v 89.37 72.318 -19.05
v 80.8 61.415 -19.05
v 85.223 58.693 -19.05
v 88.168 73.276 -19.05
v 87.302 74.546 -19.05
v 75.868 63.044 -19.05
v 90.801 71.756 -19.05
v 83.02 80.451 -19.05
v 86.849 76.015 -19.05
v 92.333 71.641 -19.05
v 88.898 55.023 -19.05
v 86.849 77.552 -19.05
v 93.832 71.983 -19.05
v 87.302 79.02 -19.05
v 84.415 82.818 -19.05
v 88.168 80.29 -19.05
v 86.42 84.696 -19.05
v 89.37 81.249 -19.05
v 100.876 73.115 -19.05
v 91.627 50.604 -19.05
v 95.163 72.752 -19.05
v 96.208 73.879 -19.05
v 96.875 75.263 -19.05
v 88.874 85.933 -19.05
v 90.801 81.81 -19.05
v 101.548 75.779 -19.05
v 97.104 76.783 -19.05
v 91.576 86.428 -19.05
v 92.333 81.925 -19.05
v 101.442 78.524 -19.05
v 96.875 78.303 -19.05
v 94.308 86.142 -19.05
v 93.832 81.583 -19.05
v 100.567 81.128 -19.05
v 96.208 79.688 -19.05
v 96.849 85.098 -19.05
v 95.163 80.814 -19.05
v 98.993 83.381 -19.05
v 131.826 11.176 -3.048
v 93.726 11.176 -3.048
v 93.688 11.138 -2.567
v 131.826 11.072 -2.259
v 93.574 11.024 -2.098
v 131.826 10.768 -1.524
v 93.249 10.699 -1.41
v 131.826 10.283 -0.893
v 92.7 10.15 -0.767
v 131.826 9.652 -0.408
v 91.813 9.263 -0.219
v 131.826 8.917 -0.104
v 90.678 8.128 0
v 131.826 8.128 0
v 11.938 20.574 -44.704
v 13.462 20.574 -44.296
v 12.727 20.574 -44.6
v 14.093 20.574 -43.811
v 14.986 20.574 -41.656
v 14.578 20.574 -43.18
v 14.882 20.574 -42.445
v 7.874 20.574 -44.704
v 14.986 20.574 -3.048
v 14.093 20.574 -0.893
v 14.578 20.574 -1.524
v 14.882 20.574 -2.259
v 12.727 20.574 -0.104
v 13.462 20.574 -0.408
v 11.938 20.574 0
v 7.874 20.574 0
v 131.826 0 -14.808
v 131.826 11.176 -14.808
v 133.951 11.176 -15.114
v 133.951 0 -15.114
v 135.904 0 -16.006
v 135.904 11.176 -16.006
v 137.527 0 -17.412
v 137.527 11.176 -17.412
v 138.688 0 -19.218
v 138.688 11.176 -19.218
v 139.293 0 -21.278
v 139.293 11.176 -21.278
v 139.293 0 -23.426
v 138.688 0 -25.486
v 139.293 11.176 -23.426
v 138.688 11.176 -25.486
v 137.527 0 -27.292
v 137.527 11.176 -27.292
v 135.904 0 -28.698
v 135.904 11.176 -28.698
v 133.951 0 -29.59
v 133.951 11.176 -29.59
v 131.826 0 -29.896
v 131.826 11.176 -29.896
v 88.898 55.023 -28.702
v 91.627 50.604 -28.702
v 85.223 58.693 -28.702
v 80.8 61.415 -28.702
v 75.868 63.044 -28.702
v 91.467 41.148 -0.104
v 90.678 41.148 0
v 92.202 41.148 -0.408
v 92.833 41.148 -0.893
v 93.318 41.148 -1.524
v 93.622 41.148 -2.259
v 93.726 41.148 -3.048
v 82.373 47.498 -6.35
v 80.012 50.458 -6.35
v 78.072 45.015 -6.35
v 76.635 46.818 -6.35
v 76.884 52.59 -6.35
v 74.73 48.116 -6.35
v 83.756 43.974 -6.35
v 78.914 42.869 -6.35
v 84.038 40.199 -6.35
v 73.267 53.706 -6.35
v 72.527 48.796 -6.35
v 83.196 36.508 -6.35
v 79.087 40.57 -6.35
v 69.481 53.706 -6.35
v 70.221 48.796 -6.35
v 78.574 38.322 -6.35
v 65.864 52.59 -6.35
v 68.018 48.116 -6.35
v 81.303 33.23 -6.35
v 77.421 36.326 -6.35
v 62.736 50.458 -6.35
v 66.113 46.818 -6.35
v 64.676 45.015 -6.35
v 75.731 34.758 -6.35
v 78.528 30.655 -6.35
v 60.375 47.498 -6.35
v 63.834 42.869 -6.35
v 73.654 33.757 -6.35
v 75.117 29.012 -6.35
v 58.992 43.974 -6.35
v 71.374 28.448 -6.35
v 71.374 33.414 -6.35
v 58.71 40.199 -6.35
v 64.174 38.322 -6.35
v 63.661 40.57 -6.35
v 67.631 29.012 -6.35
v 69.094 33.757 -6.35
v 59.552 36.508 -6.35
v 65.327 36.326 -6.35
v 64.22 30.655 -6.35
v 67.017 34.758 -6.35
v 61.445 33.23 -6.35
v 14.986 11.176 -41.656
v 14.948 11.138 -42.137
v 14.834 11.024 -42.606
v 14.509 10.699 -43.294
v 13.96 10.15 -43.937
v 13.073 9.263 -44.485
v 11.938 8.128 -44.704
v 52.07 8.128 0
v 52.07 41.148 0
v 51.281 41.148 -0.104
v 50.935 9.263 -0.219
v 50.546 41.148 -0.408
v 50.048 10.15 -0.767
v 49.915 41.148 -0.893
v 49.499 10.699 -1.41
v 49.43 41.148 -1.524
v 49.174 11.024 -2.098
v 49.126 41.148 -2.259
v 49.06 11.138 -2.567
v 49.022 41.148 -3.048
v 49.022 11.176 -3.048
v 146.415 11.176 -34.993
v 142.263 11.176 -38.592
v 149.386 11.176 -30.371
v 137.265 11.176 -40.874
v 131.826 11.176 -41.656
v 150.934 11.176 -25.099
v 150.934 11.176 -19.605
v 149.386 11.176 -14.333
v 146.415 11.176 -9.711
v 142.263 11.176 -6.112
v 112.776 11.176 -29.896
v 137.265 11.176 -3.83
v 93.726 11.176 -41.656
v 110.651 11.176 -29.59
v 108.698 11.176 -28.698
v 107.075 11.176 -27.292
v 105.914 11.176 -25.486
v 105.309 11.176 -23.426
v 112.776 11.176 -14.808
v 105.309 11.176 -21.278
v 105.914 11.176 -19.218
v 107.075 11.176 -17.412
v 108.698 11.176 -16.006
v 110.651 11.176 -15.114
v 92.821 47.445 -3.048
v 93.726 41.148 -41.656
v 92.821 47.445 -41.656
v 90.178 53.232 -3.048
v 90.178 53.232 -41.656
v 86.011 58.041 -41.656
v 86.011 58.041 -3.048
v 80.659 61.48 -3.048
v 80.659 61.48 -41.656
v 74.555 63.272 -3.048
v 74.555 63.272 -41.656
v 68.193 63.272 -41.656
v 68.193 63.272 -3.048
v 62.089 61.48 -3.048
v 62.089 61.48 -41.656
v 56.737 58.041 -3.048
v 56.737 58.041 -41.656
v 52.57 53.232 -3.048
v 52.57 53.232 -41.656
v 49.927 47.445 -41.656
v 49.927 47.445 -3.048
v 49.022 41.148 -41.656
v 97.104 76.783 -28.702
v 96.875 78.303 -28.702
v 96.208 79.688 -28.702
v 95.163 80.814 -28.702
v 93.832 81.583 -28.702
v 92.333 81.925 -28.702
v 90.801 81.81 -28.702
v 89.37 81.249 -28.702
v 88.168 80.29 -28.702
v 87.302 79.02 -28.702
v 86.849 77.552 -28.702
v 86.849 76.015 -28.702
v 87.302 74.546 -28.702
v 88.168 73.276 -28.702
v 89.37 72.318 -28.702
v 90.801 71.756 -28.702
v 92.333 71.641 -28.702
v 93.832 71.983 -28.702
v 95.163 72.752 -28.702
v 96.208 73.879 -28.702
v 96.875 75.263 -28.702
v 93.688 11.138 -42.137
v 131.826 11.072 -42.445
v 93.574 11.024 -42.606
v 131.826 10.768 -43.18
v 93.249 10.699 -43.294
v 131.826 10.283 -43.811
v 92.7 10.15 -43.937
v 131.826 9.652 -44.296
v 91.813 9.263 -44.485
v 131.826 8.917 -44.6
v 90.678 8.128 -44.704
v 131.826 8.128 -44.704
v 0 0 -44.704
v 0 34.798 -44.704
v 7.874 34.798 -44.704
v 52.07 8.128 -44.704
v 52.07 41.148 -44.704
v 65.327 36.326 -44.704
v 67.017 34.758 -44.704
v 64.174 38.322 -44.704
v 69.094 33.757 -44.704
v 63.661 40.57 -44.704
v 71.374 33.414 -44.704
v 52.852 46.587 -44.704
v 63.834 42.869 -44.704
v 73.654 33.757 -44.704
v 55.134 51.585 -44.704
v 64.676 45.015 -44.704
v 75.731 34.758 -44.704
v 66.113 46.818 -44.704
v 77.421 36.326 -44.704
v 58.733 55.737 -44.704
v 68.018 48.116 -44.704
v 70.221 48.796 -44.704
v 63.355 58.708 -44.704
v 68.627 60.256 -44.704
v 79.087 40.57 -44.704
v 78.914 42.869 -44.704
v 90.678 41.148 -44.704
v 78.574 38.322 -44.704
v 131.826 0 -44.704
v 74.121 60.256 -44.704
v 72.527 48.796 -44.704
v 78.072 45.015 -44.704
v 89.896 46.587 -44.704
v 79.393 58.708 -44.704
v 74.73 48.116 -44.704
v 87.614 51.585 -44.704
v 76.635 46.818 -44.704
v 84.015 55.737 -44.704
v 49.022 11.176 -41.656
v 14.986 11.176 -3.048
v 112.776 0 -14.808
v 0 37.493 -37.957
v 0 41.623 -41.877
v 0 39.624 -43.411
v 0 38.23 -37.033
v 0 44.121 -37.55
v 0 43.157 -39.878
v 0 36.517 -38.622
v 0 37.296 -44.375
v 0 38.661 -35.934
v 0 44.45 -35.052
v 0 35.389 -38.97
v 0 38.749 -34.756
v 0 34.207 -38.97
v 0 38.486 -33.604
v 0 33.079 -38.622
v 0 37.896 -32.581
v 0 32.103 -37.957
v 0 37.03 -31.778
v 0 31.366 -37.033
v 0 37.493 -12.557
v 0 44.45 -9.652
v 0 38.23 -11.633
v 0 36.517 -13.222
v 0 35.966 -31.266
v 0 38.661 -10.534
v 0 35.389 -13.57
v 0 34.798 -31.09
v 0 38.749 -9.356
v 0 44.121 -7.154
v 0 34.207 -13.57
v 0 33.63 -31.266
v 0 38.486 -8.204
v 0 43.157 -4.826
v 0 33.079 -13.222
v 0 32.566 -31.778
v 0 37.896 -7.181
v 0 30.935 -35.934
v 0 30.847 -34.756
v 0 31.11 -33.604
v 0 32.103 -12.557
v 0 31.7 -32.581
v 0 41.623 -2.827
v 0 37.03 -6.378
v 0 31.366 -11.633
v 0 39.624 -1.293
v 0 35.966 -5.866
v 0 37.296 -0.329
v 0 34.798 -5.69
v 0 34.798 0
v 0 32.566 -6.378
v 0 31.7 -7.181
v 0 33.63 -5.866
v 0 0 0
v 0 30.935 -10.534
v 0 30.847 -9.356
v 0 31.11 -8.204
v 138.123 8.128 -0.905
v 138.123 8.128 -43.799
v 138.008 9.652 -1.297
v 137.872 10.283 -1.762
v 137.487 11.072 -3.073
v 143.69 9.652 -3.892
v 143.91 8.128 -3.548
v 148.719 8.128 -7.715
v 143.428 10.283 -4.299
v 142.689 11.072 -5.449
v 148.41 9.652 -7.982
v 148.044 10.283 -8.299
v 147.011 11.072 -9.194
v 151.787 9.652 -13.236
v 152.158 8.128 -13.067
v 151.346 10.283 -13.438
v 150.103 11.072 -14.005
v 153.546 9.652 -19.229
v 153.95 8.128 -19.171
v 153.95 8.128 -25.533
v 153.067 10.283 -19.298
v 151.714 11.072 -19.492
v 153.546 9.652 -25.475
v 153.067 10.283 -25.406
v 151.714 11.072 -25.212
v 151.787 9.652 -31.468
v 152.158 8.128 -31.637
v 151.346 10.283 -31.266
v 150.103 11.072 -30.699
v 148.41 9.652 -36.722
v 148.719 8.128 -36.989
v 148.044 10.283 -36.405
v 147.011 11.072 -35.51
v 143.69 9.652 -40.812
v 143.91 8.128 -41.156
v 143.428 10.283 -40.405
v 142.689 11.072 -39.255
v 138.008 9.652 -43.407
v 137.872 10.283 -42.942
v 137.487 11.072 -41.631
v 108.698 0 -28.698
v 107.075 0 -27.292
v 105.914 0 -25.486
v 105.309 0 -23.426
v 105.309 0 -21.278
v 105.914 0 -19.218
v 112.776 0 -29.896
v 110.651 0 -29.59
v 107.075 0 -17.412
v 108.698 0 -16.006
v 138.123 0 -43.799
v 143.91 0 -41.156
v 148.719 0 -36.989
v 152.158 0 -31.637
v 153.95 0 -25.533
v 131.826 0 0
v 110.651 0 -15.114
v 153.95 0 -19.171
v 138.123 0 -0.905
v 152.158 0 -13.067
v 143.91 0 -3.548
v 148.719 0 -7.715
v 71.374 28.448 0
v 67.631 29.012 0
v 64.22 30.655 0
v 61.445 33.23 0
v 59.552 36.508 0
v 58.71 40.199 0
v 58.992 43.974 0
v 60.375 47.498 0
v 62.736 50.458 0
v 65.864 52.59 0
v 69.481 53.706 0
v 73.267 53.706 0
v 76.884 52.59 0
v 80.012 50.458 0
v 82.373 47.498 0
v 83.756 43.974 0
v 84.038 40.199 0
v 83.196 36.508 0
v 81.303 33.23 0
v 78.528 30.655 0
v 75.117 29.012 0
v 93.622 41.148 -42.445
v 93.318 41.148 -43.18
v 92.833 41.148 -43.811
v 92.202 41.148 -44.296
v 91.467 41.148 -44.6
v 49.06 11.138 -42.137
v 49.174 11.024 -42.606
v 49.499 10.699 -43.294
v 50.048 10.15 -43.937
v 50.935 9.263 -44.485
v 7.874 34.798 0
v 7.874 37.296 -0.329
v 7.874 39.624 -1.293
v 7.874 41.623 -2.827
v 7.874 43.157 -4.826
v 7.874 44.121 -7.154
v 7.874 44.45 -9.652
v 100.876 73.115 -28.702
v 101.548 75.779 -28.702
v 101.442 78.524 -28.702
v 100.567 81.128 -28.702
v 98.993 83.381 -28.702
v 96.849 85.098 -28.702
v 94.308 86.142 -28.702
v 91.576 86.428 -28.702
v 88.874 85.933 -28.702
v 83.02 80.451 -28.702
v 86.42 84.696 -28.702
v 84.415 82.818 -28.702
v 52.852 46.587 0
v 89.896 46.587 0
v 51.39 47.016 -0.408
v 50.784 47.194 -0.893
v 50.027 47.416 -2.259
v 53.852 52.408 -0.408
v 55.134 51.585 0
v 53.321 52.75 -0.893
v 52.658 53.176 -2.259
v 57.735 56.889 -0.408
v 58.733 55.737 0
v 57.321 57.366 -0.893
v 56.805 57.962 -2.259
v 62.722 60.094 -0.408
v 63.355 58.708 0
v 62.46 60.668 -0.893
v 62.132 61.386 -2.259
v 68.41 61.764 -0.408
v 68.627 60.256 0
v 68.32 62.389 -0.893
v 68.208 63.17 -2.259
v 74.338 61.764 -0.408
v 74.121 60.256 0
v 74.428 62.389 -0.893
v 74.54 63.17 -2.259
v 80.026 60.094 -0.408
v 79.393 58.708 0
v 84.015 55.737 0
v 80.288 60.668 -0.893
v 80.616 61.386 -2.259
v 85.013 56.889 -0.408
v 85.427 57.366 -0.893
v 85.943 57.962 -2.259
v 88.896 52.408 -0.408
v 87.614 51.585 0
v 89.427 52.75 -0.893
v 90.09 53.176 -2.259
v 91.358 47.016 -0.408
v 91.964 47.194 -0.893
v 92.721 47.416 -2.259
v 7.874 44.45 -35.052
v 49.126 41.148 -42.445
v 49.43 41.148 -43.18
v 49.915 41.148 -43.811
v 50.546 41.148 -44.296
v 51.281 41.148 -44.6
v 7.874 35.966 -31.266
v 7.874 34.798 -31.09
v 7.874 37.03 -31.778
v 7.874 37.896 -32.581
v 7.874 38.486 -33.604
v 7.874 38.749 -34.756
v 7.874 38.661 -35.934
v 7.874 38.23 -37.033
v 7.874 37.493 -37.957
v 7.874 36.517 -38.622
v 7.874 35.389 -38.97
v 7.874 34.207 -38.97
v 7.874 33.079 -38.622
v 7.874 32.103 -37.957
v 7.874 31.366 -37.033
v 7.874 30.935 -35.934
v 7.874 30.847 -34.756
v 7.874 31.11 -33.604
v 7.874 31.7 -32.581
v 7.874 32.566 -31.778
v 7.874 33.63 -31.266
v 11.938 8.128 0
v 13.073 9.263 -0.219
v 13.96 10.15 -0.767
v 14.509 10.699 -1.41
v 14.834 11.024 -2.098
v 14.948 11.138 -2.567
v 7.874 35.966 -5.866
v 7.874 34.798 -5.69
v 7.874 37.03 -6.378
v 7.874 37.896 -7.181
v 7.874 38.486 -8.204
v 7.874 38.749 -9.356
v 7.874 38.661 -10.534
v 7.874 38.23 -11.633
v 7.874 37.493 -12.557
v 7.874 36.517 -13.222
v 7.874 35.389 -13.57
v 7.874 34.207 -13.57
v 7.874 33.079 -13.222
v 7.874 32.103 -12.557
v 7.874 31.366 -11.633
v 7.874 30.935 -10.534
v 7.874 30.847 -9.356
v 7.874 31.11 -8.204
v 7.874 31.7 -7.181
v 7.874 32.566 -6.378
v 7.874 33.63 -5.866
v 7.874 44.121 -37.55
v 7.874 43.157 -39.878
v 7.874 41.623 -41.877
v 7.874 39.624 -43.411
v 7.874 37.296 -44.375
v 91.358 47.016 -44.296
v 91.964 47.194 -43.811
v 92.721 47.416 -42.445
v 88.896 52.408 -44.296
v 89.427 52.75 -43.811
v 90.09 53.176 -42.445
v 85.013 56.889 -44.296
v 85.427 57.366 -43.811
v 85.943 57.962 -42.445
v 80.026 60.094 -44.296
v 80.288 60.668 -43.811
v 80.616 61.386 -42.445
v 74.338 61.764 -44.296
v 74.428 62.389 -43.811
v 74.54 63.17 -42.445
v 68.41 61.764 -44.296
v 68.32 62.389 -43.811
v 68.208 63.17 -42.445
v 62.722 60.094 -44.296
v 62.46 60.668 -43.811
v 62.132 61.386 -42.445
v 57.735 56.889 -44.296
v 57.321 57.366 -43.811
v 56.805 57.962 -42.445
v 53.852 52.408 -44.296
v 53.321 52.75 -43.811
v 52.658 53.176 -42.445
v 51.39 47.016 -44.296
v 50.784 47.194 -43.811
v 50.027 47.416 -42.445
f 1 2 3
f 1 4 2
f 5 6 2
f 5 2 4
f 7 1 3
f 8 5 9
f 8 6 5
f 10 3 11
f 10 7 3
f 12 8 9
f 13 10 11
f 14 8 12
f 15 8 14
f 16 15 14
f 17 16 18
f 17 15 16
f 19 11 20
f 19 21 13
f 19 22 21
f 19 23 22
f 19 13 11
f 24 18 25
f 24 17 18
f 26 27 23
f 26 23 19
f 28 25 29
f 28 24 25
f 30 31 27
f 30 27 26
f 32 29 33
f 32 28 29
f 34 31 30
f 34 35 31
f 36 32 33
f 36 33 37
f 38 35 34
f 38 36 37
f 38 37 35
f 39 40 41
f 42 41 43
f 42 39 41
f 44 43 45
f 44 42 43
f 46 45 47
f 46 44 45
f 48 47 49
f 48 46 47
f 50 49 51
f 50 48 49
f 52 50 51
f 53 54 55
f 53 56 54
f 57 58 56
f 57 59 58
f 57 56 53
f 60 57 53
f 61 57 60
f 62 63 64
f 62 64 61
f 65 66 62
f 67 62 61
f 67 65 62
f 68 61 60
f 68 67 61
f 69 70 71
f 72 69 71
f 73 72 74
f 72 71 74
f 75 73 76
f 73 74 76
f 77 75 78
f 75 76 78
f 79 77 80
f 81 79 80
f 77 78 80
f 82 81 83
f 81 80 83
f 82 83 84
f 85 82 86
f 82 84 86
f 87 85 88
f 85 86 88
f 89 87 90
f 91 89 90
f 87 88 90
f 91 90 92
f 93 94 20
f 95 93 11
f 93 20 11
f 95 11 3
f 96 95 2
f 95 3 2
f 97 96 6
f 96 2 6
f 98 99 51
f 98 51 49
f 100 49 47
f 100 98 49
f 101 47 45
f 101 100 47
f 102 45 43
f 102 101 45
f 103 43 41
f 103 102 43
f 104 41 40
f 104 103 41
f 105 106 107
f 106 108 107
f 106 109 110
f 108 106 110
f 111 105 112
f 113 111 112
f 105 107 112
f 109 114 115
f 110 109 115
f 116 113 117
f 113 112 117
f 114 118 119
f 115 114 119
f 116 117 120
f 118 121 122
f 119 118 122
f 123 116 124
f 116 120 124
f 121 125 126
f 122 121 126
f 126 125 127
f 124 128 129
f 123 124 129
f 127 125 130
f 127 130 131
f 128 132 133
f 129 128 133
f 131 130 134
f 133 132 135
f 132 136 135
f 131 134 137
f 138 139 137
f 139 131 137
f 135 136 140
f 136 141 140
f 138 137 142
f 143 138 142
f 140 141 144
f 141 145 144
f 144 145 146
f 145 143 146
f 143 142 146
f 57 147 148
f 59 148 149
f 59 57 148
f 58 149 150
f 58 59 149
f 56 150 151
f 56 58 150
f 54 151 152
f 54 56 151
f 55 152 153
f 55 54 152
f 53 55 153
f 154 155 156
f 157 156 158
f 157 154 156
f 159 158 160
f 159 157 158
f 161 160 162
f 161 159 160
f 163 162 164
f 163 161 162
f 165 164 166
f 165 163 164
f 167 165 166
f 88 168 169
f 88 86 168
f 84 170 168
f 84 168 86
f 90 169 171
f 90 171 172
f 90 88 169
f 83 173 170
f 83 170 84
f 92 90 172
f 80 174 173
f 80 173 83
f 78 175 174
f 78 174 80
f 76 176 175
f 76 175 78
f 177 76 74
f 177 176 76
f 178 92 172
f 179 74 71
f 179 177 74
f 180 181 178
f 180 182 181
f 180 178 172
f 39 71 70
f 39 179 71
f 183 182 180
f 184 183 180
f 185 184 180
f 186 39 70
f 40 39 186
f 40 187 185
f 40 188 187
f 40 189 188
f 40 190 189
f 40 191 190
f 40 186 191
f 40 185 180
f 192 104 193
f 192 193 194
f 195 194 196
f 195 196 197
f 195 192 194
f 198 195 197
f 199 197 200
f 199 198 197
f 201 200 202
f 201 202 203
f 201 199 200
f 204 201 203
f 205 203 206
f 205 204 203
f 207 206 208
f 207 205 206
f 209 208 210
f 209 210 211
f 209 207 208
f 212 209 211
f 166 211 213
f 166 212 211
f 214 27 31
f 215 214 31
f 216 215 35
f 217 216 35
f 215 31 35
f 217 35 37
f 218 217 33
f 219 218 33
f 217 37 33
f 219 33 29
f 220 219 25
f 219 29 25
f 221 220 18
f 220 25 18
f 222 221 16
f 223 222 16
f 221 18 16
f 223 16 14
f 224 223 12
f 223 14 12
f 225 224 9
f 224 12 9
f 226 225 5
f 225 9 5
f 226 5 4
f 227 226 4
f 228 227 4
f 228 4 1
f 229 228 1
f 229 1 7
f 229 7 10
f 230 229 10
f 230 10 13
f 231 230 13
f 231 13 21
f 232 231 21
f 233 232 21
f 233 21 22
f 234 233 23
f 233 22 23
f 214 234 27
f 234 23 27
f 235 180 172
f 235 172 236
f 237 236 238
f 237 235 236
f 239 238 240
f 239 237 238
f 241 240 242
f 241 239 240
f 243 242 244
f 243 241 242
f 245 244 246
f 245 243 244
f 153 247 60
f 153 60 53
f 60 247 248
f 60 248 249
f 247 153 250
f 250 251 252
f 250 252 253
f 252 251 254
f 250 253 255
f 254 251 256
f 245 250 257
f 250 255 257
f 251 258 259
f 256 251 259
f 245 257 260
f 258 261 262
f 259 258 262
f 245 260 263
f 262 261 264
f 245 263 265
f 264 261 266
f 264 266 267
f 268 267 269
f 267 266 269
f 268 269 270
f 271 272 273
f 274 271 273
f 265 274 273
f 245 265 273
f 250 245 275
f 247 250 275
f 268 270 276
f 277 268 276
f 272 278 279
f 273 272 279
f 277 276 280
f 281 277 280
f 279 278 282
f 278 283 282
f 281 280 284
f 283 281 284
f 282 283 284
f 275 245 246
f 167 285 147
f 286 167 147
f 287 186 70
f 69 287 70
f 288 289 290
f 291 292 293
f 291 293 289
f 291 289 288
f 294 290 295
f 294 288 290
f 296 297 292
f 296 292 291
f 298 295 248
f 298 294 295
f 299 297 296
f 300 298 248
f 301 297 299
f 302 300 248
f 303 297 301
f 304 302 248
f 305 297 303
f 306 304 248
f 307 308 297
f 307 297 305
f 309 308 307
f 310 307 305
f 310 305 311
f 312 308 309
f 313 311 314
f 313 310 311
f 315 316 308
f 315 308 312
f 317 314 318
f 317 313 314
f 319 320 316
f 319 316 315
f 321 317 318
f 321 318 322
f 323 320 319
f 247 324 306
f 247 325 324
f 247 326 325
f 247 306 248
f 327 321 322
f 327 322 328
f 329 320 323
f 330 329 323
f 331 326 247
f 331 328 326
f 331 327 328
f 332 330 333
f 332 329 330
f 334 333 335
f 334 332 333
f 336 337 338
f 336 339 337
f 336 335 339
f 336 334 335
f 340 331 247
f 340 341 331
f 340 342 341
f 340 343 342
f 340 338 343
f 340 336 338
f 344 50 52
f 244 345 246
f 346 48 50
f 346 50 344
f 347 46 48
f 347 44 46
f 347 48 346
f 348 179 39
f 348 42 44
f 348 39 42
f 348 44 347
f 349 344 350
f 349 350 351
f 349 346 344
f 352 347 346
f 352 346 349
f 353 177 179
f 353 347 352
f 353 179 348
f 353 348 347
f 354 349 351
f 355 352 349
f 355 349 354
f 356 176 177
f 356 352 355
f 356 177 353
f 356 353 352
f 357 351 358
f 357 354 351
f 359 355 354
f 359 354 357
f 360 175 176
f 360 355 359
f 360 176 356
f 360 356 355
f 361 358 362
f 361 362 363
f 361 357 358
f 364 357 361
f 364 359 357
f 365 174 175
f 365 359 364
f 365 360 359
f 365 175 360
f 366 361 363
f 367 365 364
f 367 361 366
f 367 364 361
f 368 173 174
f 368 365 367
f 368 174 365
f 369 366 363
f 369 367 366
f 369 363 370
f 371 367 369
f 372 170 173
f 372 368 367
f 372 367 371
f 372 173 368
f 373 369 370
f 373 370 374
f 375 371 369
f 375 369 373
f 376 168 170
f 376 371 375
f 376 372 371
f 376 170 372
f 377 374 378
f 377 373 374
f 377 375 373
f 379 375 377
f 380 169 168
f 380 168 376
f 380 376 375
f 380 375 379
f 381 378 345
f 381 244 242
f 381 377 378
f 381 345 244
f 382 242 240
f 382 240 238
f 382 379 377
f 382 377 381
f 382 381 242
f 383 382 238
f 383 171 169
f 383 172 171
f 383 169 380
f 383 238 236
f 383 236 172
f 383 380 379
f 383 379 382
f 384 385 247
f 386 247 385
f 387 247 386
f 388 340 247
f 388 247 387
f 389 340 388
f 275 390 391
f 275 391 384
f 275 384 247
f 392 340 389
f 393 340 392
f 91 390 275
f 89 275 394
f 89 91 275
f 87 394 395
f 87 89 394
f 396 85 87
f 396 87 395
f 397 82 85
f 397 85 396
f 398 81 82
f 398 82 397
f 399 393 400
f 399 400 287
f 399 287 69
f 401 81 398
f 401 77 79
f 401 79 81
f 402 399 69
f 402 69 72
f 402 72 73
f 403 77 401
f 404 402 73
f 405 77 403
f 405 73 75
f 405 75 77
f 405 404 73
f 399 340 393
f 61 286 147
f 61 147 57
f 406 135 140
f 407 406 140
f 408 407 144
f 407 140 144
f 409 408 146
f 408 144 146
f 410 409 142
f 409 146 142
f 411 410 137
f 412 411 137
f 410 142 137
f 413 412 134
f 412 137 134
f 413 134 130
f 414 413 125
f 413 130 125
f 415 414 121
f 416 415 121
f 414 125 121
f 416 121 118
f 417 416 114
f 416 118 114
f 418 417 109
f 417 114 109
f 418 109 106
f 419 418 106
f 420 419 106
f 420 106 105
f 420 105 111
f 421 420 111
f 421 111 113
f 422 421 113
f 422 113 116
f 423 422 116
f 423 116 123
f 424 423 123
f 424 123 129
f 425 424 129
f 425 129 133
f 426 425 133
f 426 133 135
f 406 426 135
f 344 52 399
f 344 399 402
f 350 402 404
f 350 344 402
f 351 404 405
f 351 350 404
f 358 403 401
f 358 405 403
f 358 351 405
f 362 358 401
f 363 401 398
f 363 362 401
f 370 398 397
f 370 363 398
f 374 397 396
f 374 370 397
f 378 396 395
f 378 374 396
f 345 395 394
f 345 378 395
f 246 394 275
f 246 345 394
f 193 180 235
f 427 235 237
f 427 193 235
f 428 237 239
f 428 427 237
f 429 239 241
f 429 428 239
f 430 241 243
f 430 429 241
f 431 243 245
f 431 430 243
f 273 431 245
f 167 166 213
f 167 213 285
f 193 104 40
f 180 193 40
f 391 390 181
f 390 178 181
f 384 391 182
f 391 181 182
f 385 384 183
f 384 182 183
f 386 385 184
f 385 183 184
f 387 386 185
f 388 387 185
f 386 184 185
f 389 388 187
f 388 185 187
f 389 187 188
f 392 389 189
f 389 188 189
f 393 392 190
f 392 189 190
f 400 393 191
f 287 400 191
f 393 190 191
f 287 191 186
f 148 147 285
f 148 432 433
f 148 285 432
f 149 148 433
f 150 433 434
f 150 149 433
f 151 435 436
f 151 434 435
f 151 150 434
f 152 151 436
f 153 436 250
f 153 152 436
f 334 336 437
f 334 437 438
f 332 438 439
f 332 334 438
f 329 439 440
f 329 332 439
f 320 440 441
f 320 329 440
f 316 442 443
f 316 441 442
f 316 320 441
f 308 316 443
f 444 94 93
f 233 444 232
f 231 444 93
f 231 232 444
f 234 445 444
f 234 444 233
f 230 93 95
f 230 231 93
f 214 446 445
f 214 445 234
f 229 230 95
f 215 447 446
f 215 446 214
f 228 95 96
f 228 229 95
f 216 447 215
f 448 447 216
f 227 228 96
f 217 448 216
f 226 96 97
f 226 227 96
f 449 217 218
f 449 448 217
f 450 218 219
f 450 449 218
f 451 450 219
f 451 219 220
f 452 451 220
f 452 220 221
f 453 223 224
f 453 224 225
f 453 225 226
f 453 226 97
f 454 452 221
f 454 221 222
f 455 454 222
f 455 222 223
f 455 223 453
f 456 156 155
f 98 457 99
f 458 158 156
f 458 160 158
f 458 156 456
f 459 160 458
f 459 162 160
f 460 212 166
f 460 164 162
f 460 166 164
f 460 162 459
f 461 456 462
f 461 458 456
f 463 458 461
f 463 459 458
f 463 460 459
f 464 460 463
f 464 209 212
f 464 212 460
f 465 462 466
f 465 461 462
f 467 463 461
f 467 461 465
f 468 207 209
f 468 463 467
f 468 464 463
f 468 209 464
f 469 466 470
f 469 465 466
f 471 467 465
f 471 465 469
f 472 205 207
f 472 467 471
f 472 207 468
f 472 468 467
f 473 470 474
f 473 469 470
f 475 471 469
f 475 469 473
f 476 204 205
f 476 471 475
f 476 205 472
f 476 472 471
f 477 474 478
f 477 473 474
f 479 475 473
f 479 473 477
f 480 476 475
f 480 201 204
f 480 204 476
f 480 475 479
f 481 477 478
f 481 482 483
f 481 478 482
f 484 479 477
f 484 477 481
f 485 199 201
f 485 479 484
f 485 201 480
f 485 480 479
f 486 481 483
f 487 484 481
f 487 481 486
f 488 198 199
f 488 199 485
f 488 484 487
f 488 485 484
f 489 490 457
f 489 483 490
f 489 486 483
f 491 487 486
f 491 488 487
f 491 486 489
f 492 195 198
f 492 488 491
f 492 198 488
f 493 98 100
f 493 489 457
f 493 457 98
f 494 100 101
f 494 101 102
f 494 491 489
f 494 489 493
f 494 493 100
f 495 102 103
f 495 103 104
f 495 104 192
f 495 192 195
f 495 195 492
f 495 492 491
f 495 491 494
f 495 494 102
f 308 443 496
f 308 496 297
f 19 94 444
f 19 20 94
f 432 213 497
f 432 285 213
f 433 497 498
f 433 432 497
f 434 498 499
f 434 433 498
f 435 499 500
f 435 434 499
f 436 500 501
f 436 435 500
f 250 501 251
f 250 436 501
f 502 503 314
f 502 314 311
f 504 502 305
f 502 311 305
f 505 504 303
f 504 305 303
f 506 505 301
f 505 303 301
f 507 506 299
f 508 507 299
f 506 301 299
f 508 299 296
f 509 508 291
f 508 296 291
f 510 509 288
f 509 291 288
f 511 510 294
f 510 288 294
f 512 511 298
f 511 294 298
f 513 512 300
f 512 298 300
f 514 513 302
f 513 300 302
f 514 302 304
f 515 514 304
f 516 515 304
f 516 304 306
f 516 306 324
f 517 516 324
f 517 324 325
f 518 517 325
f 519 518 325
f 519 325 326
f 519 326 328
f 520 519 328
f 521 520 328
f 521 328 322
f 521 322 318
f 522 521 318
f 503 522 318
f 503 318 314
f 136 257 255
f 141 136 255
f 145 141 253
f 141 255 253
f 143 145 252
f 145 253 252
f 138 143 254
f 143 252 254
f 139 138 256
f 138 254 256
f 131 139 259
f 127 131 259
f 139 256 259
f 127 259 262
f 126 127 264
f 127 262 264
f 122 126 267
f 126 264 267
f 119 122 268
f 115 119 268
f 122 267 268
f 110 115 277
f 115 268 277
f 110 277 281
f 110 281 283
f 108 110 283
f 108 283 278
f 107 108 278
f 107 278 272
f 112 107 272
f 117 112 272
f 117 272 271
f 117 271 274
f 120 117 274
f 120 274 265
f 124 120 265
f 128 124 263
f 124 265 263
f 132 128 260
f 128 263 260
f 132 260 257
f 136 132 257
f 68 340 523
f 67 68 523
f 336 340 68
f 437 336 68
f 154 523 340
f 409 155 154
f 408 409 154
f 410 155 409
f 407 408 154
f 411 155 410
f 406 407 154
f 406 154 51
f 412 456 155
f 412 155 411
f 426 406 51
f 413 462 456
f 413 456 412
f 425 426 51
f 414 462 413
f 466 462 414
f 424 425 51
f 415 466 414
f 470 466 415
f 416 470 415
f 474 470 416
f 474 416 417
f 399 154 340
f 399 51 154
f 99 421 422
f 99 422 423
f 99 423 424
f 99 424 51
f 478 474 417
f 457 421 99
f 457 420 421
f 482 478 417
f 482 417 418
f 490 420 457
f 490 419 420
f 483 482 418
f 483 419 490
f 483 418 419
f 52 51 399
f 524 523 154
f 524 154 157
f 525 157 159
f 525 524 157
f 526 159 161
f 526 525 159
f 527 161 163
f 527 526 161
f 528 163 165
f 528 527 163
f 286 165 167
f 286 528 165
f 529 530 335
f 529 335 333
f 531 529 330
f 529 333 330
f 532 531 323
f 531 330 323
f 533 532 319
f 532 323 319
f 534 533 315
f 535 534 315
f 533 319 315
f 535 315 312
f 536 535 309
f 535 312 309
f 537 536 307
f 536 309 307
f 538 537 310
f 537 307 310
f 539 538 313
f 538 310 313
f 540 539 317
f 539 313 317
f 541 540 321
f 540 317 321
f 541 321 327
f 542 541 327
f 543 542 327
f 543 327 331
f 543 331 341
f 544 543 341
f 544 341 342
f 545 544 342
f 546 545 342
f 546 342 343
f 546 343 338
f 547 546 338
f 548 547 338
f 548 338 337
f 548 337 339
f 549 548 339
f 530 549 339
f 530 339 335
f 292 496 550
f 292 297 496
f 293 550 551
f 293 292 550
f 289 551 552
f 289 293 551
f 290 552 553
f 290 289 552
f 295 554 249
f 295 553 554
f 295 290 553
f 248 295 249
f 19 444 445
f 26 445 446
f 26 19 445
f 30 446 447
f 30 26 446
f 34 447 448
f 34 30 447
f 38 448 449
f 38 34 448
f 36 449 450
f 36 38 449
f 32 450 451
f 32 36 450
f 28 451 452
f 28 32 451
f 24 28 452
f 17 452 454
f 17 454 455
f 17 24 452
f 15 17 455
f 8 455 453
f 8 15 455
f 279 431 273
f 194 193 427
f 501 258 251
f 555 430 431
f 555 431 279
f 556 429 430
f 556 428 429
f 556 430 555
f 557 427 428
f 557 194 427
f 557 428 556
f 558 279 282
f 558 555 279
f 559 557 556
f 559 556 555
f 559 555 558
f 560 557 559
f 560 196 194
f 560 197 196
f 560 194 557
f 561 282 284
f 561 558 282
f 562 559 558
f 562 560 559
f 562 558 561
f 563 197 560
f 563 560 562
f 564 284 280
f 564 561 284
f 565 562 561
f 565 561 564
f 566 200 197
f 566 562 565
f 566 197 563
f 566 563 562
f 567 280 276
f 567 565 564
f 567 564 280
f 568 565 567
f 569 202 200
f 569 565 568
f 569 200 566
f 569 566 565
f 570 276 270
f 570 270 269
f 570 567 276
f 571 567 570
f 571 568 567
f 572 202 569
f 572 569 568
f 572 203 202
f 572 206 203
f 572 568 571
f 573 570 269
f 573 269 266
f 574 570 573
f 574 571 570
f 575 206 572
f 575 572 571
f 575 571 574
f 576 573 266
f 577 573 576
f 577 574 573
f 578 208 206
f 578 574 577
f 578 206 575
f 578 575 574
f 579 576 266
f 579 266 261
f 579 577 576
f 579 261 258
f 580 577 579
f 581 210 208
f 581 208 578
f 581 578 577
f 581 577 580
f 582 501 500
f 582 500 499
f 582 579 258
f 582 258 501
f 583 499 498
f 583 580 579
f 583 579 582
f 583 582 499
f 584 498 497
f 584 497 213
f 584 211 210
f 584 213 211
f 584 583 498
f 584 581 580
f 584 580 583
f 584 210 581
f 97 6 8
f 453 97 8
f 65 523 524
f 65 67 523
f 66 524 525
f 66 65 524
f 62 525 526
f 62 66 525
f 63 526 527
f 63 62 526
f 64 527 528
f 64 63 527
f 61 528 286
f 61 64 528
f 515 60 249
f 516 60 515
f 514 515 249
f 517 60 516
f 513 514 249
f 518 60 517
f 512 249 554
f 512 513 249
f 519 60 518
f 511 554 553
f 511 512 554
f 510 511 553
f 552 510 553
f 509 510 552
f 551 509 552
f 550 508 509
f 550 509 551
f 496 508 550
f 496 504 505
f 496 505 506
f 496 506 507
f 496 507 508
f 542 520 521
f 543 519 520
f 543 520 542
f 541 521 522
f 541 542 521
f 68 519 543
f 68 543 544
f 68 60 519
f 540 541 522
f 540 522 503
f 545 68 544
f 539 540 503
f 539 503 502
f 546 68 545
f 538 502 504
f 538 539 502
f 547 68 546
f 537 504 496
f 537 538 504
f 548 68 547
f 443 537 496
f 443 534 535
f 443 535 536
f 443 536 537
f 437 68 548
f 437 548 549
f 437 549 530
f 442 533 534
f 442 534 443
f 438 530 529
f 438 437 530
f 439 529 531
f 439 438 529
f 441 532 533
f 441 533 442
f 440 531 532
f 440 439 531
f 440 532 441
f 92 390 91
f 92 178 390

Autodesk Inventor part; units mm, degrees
ref_plane "YZ Plane" through (0, 0, 0) normal (1, 0, 0) x (0, 1, 0)
ref_plane "XZ Plane" through (0, 0, 0) normal (0, 1, 0) x (-1, 0, 0)
ref_plane "XY Plane" through (0, 0, 0) normal (0, 0, 1) x (1, 0, 0)
sketch "Boceto1" plane through (0, 0, 0) normal (0, 0, 1) x (1, 0, 0)
  line L0 (0, 0) -> (7.874, 0)
  line L1 (7.874, 0) -> (7.874, 44.45)
  line L2 (7.874, 44.45) -> (0, 44.45)
  line L3 (0, 44.45) -> (0, 0)
  line L4 (7.874, 0) -> (14.986, 0)
  line L5 (14.986, 0) -> (14.986, 20.574)
  line L6 (14.986, 20.574) -> (7.874, 20.574)
  line L7 (7.874, 20.574) -> (7.874, 0)
  line L8 (14.986, 0) -> (154.178, 0)
  line L9 (154.178, 0) -> (154.178, 11.176)
  line L10 (154.178, 11.176) -> (14.986, 11.176)
  line L11 (14.986, 11.176) -> (14.986, 0)
  line L12 (71.374, -17.734) -> (71.374, 53.7608) construction
  line L13 (-9.4803, 41.148) -> (163.4374, 41.148) construction
  arc A0 (93.726, 41.148) -> (49.022, 41.148) centre (71.374, 41.148) ccw
  line L14 (49.022, 41.148) -> (49.022, 11.176)
  line L15 (93.726, 41.148) -> (93.726, 11.176)
  point P0 (14.986, 11.176)
  dimension "d0" = 7.874
  dimension "d1" = 44.45
  dimension "d2" = 7.112
  dimension "d3" = 20.574
  dimension "d4" = 139.192
  dimension "d5" = 11.176
  dimension "d6" = 63.5
  dimension "d7" = 41.148
  dimension "d8" = 44.704
extrude "Base" add sketch "Boceto1" against normal blind 44.704
sketch "Boceto2" plane through (0, 0, 0) normal (-1, 0, 0) x (0, 0, 1)
  line L0 (0, 44.45) -> (-44.704, 44.45) projected
  line L1 (-35.052, 44.45) -> (-9.652, 44.45)
  line L2 (0, 34.798) -> (0, 0)
  line L3 (0, 0) -> (-44.704, 0)
  line L4 (-44.704, 0) -> (-44.704, 34.798)
  arc A0 (-35.052, 44.45) -> (-44.704, 34.798) centre (-35.052, 34.798) ccw
  arc A1 (0, 34.798) -> (-9.652, 44.45) centre (-9.652, 34.798) ccw
  line L5 (-44.704, 34.798) -> (-44.704, 44.45)
  line L6 (-44.704, 41.148) -> (-44.704, 11.176) projected
  line L7 (-44.704, 44.45) -> (-35.052, 44.45)
  line L8 (-9.652, 44.45) -> (0, 44.45)
  line L9 (0, 44.45) -> (0, 34.798)
  line L10 (0, 11.176) -> (0, 41.148) projected
  arc A2 (-35.052, 44.45) -> (-41.877, 41.623) centre (-35.052, 34.798) ccw
  arc A3 (0, 34.798) -> (-2.827, 41.623) centre (-9.652, 34.798) ccw
  dimension "d11" = 9.652
extrude "RedondeoIzquierda" cut sketch "Boceto2" against normal blind 7.874 contours L9 A1 L0 | A0 L5 L0
sketch "Boceto3" plane through (93.726, 11.176, 0) normal (0, 1, 0) x (1, 0, 0)
  line L0 (38.1, 57.3464) -> (38.1, -17.2234) construction
  line L1 (80.6333, 22.352) -> (-7.9842, 22.352) construction
  line L2 (60.452, 0) -> (60.452, 44.704) projected
  line L3 (60.452, 0) -> (0, 0) projected
  line L4 (0, 44.704) -> (60.452, 44.704) projected
  line L5 (-22.352, 117.0356) -> (-22.352, -54.5943) construction
  arc A0 (38.1, 0) -> (38.1, 44.704) centre (38.1, 22.352) ccw
  point P0 (-93.726, 0)
  point P1 (60.452, 22.352)
  dimension "d14" = 22.352
  dimension "d15" = 44.704
  dimension "d16" = 22.352
  dimension "d17" = 71.374
  dimension "d18" = 60.452
  dimension "d19" = 44.704
extrude "RedondeoDerecha" cut sketch "Boceto3" against normal blind 11.176
sketch "Boceto4" plane through (93.726, 11.176, 0) normal (0, 1, 0) x (1, 0, 0)
  line L0 (53.4052, 29.8958) -> (-6.9452, 29.8958) construction
  line L1 (53.4052, 14.8082) -> (-2.7405, 14.8082) construction
  line L2 (0, 44.704) -> (38.1, 44.704) projected
  line L3 (38.1, 0) -> (0, 0) projected
  line L4 (40.7958, 60.876) -> (40.7958, -13.6937) construction
  arc A0 (38.1, 0) -> (38.1, 44.704) centre (38.1, 22.352) ccw construction
  arc A1 (38.1, 14.8082) -> (38.1, 29.8958) centre (38.1, 22.352) ccw
  line L5 (38.1, 22.352) -> (19.05, 22.352) construction
  arc A2 (19.05, 29.8958) -> (19.05, 14.8082) centre (19.05, 22.352) ccw
  line L6 (19.05, 29.8958) -> (38.1, 29.8958)
  line L7 (19.05, 14.8082) -> (38.1, 14.8082)
  point P0 (-93.726, 0)
  dimension "d22" = 15.0876
  dimension "d23" = 44.704
  dimension "d24" = 14.8082
  dimension "d26" = 19.05
extrude "HuecoDerecha" cut sketch "Boceto4" against normal blind 11.176
sketch "Boceto5" plane through (0, 0, 0) normal (0, 0, 1) x (1, 0, 0)
  arc A0 (93.726, 41.148) -> (49.022, 41.148) centre (71.374, 41.148) ccw construction
  point P0 (0, 0)
hole "AgujeroCentral" at (71.374, 41.148, 0) direction (0, 0, -1) diameter 15.4686 end through all counterbore diameter 25.4 counterbore depth 6.35
sketch "Boceto6" plane through (0, 0, -44.704) normal (-1, 0, 0) x (0, 0, 1)
  arc A0 (44.704, 34.798) -> (35.052, 44.45) centre (35.052, 34.798) ccw projected
  arc A1 (9.652, 44.45) -> (0, 34.798) centre (9.652, 34.798) ccw projected
  circle A2 centre (9.652, 34.798) radius 3.9624
  circle A3 centre (35.052, 34.798) radius 3.9624
  line L0 (0, 0) -> (0, 34.798) projected
  line L1 (44.704, 34.798) -> (44.704, 0) projected
  line L2 (35.052, 44.45) -> (9.652, 44.45) projected
  line L3 (44.704, 0) -> (0, 0) projected
  dimension "d36" = 7.9248
  dimension "d37" = 7.9248
  dimension "d38" = 9.652
  dimension "d39" = 9.652
  dimension "d40" = 9.652
  dimension "d41" = 9.652
  dimension "d42" = 34.798
  dimension "d43" = 25.4
extrude "HuecosIzquierda" cut sketch "Boceto6" against normal blind 7.874 contours A2 | A3
sketch "Boceto7" plane through (0, 0, 0) normal (0, 0, 1) x (1, 0, 0)
  arc A0 (93.726, 41.148) -> (49.022, 41.148) centre (71.374, 41.148) ccw projected
  line L0 (93.726, 11.176) -> (93.726, 41.148) construction
  line L1 (49.022, 11.176) -> (14.986, 11.176) construction
  line L2 (93.726, 11.176) -> (49.022, 11.176) construction
  line L3 (71.374, 11.176) -> (71.374, 79.2986) construction
  line L4 (71.374, 11.176) -> (150.9411, 11.176) construction
  line L5 (71.374, 41.148) -> (130.1866, 41.148) construction
  line L6 (71.374, 41.148) -> (127.2183, 41.148) construction
  arc A1 (93.726, 41.148) -> (49.022, 41.148) centre (71.374, 41.148) ccw construction
  arc A2 (93.726, 41.148) -> (49.022, 41.148) centre (71.374, 41.148) ccw construction
  line L7 (93.726, 11.176) -> (93.726, 41.148) construction
  line L8 (93.726, 41.148) -> (93.726, 11.176) construction
  line L9 (71.374, 41.148) -> (91.948, 76.7832) construction
  line L10 (71.374, 41.148) -> (112.522, 41.148) construction
  arc A3 (100.8759, 73.1152) -> (83.0201, 80.4513) centre (91.948, 76.7832) ccw
  arc A4 (93.726, 41.148) -> (49.022, 41.148) centre (71.374, 41.148) ccw projected
  line L11 (75.8681, 63.0435) -> (83.0201, 80.4513)
  line L12 (91.6272, 50.6043) -> (100.8759, 73.1152)
  point P0 (0, 0)
  dimension "d48" = 22.352
  dimension "d49" = 41.148
  dimension "d50" = 60
  dimension "d51" = 19.304
extrude "Protuberancia" add sketch "Boceto7" against normal blind 44.704 separate body
sketch "Boceto8" plane through (0, 0, 0) normal (0, 0, 1) x (1, 0, 0)
  arc A0 (100.8759, 73.1152) -> (83.0201, 80.4513) centre (91.948, 76.7832) ccw projected
  arc A1 (100.8759, 73.1152) -> (83.0201, 80.4513) centre (91.948, 76.7832) ccw
  line L0 (75.8681, 63.0435) -> (83.0201, 80.4513) projected
  line L1 (83.0201, 80.4513) -> (75.8681, 63.0435)
  line L2 (100.8759, 73.1152) -> (91.6272, 50.6043) projected
  line L3 (100.8759, 73.1152) -> (91.6272, 50.6043)
  arc A2 (93.726, 41.148) -> (49.022, 41.148) centre (71.374, 41.148) ccw projected
  arc A3 (91.6272, 50.6043) -> (75.8681, 63.0435) centre (71.374, 41.148) ccw
  point P0 (0, 0)
extrude "RestoFrontalProtuberancia" cut sketch "Boceto8" against normal blind 19.05 bodies 2
sketch "Boceto9" plane through (0, 0, -44.704) normal (0, 0, -1) x (-1, 0, 0)
  arc A0 (-49.022, 41.148) -> (-93.726, 41.148) centre (-71.374, 41.148) ccw projected
  arc A1 (-83.0201, 80.4513) -> (-100.8759, 73.1152) centre (-91.948, 76.7832) ccw projected
  line L0 (-100.8759, 73.1152) -> (-91.6272, 50.6043) projected
  line L1 (-75.8681, 63.0435) -> (-83.0201, 80.4513) projected
  point P0 (0, 0)
extrude "RestoTraseroProtuberancia" cut sketch "Boceto9" against normal blind 16.002 bodies 2
sketch "Boceto10" plane through (0, 0, -19.05) normal (0, 0, 1) x (1, 0, 0)
  arc A0 (100.8759, 73.1152) -> (83.0201, 80.4513) centre (91.948, 76.7832) ccw projected
  circle A1 centre (91.948, 76.7832) radius 5.1562
  point P0 (0, 0)
  dimension "d58" = 10.3124
extrude "HuecoProtuberancia" cut sketch "Boceto10" against normal blind 9.652 bodies 2
fillet "Empalmes" radius 3.048 13 edges at (14.986, 15.875, 0) (32.004, 11.176, 0) (71.374, 63.5, 0) (93.726, 26.162, 0) (49.022, 26.162, 0) (154.178, 11.176, -22.352) (112.776, 11.176, -44.704) (112.776, 11.176, 0) (71.374, 63.5, -44.704) (49.022, 26.162, -44.704) (93.726, 26.162, -44.704) (32.004, 11.176, -44.704) (14.986, 15.875, -44.704)
equation "\"d16\" = 0.5 * d15"
equation "\"d24\" = -0.5 * d22 + 0.5 * d23"
properties part number "Support A01209499"
